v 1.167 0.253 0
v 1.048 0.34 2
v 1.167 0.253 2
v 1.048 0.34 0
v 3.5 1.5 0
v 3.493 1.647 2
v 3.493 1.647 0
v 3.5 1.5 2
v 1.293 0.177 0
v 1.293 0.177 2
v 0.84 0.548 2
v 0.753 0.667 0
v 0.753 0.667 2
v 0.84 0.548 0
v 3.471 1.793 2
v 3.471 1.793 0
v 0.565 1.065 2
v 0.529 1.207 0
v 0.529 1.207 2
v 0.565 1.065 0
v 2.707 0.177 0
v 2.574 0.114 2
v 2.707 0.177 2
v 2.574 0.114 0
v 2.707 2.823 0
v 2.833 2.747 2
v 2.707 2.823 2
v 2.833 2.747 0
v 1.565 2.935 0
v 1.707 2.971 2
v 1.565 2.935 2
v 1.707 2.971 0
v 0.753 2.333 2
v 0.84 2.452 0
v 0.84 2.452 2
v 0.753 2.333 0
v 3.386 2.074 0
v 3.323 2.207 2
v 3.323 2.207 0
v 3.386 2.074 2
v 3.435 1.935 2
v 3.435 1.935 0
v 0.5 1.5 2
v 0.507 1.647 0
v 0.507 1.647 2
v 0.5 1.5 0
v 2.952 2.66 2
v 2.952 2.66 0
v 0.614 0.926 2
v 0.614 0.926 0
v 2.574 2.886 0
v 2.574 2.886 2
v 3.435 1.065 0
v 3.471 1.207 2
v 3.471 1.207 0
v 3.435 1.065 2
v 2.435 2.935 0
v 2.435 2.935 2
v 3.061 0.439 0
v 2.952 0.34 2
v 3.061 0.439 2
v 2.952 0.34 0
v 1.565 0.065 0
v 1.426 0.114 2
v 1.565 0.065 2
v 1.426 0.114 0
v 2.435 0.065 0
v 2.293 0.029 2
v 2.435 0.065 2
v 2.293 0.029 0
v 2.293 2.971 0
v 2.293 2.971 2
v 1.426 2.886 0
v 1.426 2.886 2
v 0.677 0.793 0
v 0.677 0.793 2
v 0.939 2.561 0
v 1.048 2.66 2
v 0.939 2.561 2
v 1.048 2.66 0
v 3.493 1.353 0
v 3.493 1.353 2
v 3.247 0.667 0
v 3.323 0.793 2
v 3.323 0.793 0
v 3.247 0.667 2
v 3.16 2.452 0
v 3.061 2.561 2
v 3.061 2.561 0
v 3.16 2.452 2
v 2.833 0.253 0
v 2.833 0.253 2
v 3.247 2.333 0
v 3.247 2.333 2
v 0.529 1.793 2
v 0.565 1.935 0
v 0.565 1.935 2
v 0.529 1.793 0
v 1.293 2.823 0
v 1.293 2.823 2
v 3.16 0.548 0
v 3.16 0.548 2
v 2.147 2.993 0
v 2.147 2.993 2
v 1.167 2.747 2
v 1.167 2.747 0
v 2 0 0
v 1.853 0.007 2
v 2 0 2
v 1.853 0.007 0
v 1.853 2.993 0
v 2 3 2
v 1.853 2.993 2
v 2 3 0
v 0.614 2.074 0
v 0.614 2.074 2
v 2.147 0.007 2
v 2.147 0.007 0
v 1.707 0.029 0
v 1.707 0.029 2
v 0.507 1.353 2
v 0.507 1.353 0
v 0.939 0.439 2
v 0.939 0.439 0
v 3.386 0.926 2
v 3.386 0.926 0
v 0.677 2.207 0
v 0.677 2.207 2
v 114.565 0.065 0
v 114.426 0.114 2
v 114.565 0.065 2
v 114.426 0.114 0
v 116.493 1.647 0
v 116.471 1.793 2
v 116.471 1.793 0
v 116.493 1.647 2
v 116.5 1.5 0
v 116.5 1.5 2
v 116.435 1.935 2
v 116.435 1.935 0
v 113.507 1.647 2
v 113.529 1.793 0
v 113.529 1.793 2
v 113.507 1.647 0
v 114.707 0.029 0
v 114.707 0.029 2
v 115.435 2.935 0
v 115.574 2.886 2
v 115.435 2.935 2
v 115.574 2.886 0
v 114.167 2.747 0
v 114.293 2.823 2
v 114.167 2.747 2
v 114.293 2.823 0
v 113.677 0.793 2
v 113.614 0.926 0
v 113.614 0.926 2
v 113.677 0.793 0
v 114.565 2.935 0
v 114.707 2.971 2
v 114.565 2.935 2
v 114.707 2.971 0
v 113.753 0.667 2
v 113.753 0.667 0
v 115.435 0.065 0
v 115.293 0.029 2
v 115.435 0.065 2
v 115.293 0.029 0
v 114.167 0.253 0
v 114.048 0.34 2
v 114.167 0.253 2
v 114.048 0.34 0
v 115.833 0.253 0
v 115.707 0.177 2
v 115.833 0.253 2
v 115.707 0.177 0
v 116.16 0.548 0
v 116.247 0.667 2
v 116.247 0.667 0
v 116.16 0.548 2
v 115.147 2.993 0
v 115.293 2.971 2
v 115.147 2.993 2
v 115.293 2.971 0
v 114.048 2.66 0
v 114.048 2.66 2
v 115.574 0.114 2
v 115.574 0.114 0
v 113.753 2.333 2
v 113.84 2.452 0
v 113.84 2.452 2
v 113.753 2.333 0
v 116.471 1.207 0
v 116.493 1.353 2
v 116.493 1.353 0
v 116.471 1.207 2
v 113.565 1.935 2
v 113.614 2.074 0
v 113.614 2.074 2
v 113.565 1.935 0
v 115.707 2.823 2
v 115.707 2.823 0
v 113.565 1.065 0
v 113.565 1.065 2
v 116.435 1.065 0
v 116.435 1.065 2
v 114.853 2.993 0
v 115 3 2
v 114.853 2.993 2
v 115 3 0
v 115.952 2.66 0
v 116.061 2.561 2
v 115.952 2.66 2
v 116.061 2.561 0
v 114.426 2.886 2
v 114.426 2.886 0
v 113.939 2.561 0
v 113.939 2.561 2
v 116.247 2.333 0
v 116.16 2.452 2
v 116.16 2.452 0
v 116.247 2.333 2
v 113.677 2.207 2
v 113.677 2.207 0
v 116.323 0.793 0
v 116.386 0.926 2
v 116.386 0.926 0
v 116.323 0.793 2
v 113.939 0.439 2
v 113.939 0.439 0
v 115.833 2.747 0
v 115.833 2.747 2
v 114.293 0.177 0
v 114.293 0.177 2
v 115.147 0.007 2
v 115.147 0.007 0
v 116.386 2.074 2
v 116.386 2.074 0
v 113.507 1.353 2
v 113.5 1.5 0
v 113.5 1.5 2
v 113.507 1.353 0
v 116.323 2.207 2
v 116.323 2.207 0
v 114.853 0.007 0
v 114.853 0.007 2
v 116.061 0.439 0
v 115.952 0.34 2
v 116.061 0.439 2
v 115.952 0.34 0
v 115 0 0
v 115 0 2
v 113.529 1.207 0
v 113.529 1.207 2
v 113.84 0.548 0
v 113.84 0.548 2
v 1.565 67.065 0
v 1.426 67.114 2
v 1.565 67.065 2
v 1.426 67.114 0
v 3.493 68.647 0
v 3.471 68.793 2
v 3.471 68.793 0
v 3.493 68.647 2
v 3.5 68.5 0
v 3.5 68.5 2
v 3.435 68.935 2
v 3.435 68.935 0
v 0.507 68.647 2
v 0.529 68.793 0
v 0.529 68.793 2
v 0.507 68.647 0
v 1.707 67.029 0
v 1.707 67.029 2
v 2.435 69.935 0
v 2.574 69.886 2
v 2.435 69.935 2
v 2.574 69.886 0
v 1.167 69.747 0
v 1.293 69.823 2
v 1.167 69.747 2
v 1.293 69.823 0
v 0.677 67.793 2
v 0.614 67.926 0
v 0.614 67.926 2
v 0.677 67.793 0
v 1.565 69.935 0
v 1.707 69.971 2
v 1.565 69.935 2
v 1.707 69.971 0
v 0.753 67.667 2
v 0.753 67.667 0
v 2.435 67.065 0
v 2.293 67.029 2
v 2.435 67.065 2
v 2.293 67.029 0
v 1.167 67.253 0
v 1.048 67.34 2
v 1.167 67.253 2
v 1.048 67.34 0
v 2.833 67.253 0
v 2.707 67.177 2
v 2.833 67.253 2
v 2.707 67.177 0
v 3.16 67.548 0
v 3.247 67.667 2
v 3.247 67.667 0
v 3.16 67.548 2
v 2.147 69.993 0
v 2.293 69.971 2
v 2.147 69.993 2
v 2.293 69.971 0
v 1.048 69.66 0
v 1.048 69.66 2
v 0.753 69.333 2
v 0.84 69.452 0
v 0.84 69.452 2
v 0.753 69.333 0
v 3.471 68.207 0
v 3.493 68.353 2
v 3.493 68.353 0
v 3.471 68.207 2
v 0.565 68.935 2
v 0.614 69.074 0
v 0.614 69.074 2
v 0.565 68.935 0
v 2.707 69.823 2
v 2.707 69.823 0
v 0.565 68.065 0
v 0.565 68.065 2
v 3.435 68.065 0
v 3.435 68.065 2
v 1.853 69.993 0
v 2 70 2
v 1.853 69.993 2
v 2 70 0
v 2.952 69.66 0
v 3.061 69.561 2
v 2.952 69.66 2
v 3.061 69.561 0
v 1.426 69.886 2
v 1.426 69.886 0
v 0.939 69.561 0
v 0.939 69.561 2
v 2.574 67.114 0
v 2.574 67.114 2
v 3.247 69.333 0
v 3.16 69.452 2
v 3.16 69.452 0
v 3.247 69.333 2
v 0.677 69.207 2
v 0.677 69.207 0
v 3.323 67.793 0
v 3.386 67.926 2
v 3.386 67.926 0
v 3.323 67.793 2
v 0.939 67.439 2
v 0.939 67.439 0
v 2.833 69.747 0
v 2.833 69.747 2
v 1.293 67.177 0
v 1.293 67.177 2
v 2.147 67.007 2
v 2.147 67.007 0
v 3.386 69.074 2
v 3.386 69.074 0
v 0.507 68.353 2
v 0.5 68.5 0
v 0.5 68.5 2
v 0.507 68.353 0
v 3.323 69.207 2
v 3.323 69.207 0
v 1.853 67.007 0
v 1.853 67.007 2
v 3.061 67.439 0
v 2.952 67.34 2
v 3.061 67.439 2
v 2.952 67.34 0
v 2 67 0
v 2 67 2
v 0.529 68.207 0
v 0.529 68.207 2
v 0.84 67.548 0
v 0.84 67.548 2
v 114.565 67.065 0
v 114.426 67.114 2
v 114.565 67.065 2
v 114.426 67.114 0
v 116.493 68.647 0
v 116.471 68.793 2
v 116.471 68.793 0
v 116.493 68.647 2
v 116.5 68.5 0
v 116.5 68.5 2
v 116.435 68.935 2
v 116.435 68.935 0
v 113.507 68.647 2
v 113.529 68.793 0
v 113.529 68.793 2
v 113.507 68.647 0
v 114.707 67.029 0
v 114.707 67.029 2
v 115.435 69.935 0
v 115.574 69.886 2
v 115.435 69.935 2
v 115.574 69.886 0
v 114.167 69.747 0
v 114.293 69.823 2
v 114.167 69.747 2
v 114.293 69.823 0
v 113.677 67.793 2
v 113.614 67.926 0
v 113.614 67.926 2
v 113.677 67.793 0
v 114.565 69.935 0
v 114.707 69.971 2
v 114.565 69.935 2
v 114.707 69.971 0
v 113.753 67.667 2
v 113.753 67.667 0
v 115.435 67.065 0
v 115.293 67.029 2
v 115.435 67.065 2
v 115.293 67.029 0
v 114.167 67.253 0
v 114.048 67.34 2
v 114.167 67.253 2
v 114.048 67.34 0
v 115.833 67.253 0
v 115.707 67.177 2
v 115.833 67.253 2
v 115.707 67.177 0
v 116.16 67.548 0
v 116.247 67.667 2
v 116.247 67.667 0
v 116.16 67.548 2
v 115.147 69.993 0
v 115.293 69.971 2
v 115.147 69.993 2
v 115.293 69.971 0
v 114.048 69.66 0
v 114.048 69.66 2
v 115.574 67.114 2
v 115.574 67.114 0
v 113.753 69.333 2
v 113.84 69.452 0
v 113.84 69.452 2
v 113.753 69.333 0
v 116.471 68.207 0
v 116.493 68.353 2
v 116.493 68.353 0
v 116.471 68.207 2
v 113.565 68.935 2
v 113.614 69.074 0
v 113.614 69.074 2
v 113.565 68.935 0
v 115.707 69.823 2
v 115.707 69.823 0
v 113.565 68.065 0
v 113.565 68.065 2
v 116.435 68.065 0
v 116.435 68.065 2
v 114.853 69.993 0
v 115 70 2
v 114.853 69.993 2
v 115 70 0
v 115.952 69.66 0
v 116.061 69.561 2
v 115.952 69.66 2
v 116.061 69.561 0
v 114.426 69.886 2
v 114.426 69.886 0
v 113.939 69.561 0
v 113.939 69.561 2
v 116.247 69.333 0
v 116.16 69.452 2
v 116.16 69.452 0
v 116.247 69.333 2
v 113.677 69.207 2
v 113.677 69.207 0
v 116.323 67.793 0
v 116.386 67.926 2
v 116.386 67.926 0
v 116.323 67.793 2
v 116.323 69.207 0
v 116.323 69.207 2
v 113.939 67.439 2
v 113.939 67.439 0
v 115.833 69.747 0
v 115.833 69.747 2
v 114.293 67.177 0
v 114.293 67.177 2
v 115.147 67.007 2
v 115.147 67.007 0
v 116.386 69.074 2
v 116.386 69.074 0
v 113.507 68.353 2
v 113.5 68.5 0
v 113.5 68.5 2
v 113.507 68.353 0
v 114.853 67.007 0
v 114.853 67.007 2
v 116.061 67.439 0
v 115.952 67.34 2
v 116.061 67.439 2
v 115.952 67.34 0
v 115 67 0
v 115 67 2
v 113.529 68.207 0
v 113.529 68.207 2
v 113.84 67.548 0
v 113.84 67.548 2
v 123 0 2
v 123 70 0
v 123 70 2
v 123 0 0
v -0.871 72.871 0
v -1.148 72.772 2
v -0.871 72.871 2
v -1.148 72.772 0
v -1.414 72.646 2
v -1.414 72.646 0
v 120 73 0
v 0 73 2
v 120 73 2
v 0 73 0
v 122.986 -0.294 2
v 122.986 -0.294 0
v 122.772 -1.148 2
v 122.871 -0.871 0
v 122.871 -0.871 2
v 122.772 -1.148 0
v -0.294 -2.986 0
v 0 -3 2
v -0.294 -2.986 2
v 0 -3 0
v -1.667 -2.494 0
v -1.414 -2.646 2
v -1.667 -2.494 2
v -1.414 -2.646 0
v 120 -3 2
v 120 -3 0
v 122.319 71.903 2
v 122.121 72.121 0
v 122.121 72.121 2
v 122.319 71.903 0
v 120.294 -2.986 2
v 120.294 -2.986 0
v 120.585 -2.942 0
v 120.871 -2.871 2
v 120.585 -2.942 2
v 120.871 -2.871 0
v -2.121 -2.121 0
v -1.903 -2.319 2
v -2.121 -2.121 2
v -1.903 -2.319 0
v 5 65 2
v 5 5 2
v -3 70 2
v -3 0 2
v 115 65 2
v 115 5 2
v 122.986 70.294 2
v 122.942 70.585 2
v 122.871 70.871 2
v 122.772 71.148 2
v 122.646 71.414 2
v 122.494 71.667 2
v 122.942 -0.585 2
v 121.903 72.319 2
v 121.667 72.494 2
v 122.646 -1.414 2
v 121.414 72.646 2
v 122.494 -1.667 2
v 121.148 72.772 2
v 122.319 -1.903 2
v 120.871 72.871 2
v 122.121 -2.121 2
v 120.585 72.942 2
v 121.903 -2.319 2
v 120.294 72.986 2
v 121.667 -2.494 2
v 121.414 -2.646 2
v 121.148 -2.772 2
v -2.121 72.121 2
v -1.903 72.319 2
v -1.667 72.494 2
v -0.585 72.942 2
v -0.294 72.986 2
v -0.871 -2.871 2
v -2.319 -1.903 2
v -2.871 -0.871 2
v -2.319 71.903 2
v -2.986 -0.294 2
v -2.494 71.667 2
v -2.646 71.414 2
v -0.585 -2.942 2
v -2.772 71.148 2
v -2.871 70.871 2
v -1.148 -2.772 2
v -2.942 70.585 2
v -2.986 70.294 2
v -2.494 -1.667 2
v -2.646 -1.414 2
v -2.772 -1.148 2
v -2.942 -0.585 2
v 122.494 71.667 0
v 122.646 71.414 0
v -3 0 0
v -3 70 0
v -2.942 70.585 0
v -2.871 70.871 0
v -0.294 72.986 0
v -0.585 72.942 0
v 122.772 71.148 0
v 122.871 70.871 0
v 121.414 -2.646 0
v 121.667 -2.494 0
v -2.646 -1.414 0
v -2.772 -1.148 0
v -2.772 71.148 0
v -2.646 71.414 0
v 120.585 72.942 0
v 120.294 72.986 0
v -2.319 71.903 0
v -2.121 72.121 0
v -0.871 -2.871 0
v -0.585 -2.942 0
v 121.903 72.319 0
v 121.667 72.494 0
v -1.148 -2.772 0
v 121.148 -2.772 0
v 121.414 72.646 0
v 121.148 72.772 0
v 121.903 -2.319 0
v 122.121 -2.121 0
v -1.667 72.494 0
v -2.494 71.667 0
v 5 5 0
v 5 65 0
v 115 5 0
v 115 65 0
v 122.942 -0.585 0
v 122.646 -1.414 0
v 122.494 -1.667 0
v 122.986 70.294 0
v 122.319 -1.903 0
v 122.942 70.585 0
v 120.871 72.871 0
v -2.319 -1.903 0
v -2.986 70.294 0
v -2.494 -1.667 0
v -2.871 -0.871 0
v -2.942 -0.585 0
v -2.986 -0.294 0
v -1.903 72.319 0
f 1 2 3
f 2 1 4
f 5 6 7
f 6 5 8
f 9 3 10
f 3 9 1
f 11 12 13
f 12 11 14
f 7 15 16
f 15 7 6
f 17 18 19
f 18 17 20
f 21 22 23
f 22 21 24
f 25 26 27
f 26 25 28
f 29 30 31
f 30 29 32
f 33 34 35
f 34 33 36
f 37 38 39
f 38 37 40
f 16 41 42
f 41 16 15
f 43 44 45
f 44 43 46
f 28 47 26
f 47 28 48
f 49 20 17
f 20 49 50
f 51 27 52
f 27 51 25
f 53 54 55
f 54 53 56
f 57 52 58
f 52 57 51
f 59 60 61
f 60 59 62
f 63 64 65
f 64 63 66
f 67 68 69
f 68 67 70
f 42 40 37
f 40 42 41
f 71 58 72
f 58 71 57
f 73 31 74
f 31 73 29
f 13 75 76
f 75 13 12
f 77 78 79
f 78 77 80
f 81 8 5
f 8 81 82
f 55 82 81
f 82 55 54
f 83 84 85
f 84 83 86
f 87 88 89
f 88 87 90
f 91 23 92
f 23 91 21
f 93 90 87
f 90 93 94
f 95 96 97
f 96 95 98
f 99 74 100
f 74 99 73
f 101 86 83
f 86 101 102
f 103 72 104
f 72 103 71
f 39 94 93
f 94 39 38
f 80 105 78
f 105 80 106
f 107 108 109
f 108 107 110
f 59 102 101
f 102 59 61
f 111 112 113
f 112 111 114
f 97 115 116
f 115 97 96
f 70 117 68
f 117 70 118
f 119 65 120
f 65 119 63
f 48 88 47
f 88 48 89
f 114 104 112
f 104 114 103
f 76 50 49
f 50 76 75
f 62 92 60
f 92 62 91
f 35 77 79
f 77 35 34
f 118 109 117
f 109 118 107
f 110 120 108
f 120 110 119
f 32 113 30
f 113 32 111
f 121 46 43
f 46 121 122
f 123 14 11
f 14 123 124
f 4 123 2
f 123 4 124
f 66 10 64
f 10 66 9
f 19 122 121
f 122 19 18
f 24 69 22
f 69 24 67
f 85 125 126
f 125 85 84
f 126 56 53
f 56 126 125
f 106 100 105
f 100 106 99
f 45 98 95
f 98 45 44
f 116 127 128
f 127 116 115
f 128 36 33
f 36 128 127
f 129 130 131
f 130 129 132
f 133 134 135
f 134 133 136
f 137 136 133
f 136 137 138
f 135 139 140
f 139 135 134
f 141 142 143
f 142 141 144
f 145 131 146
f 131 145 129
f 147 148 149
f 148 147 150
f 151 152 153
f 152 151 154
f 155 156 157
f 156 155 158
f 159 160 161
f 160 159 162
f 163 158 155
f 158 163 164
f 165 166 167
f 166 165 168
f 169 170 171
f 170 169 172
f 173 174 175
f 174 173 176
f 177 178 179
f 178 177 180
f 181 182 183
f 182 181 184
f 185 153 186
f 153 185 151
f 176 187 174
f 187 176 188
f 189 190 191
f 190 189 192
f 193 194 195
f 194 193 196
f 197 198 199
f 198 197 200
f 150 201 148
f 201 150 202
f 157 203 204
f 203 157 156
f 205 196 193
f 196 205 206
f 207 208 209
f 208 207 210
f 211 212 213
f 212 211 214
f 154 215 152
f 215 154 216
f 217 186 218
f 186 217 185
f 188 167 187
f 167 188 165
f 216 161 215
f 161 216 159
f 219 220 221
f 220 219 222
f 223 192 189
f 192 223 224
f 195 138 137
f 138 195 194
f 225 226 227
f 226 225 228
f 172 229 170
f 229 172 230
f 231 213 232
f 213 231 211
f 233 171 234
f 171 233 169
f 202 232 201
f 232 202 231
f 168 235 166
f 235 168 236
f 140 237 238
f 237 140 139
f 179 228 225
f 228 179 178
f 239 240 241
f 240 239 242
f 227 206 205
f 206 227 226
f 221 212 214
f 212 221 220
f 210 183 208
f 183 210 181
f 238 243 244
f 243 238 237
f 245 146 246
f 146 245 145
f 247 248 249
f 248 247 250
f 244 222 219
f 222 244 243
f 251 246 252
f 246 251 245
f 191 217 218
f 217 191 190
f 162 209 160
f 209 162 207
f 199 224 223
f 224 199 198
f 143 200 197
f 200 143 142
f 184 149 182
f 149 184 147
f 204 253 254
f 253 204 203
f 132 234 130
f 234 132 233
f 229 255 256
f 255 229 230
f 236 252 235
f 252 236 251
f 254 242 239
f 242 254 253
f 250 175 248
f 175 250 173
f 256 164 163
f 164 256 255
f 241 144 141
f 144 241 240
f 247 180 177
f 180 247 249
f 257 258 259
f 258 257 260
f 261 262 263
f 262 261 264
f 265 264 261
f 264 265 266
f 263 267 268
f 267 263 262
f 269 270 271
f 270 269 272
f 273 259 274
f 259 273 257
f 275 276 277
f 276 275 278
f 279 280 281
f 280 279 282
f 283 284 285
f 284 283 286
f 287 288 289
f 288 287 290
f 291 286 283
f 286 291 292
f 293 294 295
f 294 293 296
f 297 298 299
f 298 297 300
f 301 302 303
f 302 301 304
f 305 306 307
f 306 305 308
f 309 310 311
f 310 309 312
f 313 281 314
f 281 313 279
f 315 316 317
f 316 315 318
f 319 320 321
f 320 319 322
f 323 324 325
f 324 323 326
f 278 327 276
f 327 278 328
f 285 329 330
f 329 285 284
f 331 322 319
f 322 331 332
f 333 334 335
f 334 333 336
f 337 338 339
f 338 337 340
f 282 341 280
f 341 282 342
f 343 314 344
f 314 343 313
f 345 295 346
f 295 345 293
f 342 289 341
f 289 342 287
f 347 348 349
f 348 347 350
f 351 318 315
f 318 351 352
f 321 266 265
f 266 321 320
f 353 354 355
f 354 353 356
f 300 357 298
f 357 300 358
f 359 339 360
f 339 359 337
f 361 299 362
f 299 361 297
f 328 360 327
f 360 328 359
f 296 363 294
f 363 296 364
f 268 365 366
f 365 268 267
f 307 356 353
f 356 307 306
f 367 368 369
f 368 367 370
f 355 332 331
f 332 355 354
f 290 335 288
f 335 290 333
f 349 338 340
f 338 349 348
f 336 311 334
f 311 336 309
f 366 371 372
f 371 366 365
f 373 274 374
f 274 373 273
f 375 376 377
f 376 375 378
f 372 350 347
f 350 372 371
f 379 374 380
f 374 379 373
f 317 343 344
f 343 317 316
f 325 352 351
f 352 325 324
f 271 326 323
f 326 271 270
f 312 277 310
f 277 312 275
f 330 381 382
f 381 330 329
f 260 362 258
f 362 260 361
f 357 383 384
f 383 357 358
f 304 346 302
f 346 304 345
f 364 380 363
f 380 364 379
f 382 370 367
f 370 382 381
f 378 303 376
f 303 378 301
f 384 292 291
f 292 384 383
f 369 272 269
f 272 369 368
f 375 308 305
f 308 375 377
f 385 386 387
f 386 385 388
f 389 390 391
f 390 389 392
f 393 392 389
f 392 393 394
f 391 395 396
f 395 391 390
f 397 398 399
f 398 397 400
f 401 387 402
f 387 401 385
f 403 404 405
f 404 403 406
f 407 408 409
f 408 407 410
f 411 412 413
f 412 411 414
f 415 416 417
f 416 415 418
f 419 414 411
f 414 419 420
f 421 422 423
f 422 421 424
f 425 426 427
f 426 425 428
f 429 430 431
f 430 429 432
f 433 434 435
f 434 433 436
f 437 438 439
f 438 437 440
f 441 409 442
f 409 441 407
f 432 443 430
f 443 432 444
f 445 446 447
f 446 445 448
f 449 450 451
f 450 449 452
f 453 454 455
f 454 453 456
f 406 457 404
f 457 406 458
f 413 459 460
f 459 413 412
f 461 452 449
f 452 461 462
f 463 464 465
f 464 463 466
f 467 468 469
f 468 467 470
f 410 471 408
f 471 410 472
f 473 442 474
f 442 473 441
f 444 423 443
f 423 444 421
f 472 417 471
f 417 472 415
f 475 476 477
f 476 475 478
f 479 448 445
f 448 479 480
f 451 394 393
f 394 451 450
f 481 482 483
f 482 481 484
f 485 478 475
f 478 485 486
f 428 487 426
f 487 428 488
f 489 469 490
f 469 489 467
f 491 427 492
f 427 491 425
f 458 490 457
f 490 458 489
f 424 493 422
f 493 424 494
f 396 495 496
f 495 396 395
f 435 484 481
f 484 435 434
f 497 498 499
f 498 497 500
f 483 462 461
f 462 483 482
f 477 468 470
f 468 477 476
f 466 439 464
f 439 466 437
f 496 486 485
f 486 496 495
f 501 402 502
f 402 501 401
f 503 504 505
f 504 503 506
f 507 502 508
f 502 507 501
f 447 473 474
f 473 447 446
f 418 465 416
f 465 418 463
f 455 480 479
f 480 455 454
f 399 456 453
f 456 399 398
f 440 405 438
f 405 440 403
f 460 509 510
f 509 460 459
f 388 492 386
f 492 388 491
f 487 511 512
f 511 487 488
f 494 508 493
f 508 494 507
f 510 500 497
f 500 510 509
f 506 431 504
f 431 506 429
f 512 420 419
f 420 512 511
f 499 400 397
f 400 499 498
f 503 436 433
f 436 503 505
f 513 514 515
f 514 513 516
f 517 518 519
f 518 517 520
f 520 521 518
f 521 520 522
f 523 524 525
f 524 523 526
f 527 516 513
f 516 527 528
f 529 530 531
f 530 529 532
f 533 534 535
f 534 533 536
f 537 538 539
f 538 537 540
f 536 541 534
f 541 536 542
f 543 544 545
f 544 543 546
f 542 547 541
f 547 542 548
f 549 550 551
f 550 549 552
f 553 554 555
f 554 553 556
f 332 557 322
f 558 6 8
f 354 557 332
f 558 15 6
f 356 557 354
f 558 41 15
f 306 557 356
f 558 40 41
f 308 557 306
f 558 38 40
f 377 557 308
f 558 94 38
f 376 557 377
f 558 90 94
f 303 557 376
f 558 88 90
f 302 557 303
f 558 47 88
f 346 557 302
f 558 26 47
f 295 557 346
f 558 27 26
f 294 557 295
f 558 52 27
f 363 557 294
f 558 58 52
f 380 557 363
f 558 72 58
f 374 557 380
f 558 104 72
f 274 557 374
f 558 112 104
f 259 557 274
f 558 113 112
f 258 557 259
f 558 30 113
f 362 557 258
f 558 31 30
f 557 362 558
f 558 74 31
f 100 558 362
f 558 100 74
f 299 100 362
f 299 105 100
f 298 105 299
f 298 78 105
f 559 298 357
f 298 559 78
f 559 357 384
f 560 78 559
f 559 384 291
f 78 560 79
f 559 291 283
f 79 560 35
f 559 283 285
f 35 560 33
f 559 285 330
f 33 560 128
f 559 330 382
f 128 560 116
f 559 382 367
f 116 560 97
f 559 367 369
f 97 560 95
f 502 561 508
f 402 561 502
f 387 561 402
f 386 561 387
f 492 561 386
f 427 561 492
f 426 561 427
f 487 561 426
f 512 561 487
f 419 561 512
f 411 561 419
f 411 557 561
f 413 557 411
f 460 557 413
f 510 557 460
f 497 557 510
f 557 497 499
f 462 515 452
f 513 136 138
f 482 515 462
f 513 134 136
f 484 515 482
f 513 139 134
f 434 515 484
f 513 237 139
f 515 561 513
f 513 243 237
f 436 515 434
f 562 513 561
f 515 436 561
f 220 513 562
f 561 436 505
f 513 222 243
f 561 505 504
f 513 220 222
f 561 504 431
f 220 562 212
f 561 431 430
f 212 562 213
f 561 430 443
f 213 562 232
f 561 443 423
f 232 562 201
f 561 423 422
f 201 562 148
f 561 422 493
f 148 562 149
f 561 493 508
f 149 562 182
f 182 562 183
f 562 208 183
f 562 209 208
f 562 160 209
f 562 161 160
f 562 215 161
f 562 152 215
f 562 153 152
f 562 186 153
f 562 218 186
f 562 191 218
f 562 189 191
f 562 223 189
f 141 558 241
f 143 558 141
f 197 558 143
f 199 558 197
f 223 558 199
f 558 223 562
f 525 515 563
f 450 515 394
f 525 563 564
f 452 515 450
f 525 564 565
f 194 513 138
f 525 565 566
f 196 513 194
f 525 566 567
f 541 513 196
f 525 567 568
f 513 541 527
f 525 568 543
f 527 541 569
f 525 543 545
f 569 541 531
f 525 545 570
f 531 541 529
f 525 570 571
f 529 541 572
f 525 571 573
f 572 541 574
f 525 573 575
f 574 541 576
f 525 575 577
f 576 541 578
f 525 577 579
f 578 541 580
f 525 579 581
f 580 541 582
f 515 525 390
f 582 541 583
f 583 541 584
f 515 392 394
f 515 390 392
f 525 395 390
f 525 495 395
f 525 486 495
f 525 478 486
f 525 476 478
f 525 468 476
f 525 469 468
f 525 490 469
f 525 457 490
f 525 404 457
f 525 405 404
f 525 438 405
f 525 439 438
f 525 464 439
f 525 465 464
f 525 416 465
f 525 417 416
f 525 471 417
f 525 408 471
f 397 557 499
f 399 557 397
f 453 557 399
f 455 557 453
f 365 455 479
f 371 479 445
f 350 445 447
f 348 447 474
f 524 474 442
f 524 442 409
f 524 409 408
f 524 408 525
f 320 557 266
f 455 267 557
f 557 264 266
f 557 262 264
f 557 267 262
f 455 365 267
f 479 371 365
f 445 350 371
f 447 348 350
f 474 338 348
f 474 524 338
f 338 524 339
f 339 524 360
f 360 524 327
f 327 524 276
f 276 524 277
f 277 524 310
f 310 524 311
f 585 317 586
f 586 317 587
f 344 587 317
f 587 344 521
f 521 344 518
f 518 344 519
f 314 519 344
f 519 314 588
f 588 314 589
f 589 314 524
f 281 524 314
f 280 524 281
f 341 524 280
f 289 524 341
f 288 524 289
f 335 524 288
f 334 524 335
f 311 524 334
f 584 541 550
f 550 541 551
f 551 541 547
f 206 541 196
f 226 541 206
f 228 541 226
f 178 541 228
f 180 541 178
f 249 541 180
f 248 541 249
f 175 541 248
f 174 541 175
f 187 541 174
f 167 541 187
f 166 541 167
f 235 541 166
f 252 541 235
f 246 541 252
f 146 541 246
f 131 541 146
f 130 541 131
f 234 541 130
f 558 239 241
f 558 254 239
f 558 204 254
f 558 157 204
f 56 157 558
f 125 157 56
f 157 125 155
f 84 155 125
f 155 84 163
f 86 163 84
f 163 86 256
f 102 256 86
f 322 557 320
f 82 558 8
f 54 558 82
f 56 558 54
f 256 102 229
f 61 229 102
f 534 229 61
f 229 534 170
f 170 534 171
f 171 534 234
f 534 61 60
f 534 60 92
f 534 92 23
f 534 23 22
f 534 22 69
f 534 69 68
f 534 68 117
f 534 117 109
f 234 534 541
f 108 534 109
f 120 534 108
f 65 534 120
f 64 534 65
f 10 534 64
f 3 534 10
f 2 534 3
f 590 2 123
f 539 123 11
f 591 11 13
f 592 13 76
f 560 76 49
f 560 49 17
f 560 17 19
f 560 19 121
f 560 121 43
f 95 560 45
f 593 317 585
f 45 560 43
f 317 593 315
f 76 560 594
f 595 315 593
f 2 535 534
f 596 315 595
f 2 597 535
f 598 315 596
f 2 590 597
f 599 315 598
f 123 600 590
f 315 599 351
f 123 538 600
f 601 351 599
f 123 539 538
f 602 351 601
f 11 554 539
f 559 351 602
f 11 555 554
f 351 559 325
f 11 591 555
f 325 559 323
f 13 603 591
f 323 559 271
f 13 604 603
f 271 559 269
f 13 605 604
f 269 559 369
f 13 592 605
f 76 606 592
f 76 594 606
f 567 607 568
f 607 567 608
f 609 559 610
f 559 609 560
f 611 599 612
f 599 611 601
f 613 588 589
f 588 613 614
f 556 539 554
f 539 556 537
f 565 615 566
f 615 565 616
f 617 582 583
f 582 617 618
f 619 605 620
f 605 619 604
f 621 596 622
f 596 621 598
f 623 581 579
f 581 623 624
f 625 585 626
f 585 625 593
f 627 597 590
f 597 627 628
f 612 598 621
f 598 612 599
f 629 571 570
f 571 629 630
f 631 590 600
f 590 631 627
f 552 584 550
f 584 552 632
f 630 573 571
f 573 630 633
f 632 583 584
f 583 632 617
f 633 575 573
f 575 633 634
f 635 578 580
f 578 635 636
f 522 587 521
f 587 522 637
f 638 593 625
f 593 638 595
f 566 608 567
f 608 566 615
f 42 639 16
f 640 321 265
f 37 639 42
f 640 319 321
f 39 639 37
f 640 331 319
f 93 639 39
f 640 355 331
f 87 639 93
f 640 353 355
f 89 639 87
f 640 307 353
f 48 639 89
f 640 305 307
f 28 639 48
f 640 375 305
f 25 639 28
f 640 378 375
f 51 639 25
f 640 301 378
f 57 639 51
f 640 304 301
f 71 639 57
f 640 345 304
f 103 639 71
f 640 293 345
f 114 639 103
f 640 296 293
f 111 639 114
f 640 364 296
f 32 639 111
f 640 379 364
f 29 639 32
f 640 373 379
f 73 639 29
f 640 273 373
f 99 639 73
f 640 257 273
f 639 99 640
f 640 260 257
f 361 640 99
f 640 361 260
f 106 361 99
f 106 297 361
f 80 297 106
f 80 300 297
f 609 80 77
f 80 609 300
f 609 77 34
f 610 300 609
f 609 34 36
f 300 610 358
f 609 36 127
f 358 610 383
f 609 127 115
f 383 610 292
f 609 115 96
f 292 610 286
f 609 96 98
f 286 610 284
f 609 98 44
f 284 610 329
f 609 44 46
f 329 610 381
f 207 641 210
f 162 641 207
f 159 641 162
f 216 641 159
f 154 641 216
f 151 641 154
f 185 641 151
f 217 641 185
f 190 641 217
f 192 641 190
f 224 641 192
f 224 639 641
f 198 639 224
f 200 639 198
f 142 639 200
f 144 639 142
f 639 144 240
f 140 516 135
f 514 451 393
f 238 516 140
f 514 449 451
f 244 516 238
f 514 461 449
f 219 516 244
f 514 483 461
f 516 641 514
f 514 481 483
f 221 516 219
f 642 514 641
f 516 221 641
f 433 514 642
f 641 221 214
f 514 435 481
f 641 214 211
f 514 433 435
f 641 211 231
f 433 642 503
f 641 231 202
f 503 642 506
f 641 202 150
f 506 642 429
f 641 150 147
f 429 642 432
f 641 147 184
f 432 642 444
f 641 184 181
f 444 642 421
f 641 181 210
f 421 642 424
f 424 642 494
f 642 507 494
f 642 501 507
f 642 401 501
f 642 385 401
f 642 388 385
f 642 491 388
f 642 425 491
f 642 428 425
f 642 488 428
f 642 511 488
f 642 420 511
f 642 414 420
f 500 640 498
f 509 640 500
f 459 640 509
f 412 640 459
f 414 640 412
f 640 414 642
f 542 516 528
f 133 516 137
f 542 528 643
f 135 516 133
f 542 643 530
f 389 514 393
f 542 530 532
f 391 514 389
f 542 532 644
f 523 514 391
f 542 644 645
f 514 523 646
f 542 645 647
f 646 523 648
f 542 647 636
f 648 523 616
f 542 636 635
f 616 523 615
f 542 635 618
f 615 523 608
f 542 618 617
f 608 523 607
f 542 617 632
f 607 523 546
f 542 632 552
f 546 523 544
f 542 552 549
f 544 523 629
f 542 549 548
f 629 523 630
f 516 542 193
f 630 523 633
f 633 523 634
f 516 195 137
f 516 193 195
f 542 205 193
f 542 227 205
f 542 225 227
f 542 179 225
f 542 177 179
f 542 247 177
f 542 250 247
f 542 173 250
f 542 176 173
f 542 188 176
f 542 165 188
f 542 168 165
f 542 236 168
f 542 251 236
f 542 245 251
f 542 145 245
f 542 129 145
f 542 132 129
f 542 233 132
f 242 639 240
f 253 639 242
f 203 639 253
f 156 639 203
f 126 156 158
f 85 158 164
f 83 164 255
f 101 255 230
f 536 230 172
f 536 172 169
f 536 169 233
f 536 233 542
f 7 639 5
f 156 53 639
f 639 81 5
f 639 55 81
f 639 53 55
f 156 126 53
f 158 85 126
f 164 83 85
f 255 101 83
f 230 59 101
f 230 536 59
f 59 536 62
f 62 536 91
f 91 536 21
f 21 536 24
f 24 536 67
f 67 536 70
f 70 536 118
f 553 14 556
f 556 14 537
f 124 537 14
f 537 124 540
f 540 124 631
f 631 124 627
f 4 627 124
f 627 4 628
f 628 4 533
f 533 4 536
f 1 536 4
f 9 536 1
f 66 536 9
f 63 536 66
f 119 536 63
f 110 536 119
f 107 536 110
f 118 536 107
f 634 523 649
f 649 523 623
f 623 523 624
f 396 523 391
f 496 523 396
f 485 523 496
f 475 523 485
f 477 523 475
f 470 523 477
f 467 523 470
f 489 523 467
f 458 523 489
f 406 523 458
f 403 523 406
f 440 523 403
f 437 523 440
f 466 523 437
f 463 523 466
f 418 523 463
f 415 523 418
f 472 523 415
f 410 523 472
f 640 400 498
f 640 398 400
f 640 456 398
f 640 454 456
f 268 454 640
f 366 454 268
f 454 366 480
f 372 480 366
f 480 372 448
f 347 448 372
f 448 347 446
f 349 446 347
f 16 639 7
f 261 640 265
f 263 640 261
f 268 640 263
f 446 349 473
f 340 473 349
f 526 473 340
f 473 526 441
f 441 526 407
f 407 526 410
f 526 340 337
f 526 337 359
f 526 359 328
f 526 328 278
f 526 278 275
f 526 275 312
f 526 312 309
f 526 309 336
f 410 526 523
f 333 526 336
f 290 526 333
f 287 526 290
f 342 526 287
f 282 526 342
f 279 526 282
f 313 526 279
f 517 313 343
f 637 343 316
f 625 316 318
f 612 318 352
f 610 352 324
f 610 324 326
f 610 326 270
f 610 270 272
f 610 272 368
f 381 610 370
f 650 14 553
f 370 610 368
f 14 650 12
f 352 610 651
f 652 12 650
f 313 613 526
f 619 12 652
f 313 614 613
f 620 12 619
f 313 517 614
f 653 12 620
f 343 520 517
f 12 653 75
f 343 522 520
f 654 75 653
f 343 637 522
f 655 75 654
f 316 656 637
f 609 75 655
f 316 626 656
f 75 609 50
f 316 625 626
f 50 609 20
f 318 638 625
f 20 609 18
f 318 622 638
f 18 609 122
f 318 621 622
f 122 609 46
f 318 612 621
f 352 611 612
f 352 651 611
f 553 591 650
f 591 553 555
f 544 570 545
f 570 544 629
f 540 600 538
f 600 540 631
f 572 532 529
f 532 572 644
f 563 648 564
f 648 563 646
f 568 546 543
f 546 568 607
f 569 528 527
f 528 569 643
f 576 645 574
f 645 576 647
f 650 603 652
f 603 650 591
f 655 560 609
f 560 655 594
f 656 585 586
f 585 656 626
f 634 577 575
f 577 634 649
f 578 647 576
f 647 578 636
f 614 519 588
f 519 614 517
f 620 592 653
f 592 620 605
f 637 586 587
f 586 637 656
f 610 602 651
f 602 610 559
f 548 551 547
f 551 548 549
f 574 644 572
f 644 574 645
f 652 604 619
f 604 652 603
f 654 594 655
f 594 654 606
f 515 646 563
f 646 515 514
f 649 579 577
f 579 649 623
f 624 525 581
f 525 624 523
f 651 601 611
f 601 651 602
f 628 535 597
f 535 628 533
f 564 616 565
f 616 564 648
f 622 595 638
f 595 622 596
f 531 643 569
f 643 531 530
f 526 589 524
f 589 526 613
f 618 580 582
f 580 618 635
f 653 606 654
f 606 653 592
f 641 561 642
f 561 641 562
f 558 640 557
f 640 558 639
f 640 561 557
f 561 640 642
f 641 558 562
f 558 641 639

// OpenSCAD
//length = 120;
//width = 70;
//framewidth = 10;
//thickness = 6;
holesize = 3;
supportwidth = 3;
firstholex=2;
secondholex=5;

$fn=64;

module clusterplate(length=120,width=70,framewidth=10,thickness=6)
union()
{
    //difference()
    //{
        //minkowski()
        //{
        //    cube([length,width,1]);
        //    cylinder(r=3,h=1);
        //}
        
        //translate([framewidth/2,framewidth/2,-thickness/2]) rotate([0,0,0]) color("blue") cube([length-framewidth,width-framewidth,thickness]);
        //translate([0,0,-0.5*thickness])
        //linear_extrude(height = thickness*2, center = true) 
        //{
        //    grate(length, width, holesize, supportwidth) polygon([[0,holesize],[2*holesize,0],[0,-holesize],[-2*holesize,0]]);
        //}
    //}
    difference()
    {
        minkowski()
        {
            cube([length,width,1]);
            cylinder(r=3,h=1);
        }
        translate([framewidth/2,framewidth/2,-thickness/2]) rotate([0,0,0]) cube([length-framewidth,width-framewidth,thickness]);
        clusterplate_holes(length=120,width=70,thickness=6);
    }
}

module clusterplate_holes(length=120,width=70,thickness=6)
{
    translate([firstholex,1.5,-thickness+1.5]) cylinder(d=holesize,h=thickness+1);
    translate([-secondholex+length,1.5,-thickness+1.5]) cylinder(d=holesize,h=thickness+1);
    translate([firstholex,width-1.5,-thickness+1.5]) cylinder(d=holesize,h=thickness+1);
    translate([-secondholex+length,width-1.5,-thickness+1.5]) cylinder(d=holesize,h=thickness+1);
}


module grate(length, width, holesize, supportwidth)
{
    frame = 0;
    countx = (length-2*frame)/(2*holesize+supportwidth);
    for(x = [0 : countx-1])
    {
        county = (width-2*frame)/(holesize);
        for(y = [0 : county-1])
        {
            if (y % 2 == 0)
            {
                translate([2*frame + (4*holesize+supportwidth)/2 + x*4*holesize+x*supportwidth,frame+1.5*y*holesize,0]) children();
            }
            else
            {
                translate([2*frame + x*4*holesize+x*supportwidth,frame+1.5*y*holesize,0]) children();
            }
        }
    }
}

clusterplate();
